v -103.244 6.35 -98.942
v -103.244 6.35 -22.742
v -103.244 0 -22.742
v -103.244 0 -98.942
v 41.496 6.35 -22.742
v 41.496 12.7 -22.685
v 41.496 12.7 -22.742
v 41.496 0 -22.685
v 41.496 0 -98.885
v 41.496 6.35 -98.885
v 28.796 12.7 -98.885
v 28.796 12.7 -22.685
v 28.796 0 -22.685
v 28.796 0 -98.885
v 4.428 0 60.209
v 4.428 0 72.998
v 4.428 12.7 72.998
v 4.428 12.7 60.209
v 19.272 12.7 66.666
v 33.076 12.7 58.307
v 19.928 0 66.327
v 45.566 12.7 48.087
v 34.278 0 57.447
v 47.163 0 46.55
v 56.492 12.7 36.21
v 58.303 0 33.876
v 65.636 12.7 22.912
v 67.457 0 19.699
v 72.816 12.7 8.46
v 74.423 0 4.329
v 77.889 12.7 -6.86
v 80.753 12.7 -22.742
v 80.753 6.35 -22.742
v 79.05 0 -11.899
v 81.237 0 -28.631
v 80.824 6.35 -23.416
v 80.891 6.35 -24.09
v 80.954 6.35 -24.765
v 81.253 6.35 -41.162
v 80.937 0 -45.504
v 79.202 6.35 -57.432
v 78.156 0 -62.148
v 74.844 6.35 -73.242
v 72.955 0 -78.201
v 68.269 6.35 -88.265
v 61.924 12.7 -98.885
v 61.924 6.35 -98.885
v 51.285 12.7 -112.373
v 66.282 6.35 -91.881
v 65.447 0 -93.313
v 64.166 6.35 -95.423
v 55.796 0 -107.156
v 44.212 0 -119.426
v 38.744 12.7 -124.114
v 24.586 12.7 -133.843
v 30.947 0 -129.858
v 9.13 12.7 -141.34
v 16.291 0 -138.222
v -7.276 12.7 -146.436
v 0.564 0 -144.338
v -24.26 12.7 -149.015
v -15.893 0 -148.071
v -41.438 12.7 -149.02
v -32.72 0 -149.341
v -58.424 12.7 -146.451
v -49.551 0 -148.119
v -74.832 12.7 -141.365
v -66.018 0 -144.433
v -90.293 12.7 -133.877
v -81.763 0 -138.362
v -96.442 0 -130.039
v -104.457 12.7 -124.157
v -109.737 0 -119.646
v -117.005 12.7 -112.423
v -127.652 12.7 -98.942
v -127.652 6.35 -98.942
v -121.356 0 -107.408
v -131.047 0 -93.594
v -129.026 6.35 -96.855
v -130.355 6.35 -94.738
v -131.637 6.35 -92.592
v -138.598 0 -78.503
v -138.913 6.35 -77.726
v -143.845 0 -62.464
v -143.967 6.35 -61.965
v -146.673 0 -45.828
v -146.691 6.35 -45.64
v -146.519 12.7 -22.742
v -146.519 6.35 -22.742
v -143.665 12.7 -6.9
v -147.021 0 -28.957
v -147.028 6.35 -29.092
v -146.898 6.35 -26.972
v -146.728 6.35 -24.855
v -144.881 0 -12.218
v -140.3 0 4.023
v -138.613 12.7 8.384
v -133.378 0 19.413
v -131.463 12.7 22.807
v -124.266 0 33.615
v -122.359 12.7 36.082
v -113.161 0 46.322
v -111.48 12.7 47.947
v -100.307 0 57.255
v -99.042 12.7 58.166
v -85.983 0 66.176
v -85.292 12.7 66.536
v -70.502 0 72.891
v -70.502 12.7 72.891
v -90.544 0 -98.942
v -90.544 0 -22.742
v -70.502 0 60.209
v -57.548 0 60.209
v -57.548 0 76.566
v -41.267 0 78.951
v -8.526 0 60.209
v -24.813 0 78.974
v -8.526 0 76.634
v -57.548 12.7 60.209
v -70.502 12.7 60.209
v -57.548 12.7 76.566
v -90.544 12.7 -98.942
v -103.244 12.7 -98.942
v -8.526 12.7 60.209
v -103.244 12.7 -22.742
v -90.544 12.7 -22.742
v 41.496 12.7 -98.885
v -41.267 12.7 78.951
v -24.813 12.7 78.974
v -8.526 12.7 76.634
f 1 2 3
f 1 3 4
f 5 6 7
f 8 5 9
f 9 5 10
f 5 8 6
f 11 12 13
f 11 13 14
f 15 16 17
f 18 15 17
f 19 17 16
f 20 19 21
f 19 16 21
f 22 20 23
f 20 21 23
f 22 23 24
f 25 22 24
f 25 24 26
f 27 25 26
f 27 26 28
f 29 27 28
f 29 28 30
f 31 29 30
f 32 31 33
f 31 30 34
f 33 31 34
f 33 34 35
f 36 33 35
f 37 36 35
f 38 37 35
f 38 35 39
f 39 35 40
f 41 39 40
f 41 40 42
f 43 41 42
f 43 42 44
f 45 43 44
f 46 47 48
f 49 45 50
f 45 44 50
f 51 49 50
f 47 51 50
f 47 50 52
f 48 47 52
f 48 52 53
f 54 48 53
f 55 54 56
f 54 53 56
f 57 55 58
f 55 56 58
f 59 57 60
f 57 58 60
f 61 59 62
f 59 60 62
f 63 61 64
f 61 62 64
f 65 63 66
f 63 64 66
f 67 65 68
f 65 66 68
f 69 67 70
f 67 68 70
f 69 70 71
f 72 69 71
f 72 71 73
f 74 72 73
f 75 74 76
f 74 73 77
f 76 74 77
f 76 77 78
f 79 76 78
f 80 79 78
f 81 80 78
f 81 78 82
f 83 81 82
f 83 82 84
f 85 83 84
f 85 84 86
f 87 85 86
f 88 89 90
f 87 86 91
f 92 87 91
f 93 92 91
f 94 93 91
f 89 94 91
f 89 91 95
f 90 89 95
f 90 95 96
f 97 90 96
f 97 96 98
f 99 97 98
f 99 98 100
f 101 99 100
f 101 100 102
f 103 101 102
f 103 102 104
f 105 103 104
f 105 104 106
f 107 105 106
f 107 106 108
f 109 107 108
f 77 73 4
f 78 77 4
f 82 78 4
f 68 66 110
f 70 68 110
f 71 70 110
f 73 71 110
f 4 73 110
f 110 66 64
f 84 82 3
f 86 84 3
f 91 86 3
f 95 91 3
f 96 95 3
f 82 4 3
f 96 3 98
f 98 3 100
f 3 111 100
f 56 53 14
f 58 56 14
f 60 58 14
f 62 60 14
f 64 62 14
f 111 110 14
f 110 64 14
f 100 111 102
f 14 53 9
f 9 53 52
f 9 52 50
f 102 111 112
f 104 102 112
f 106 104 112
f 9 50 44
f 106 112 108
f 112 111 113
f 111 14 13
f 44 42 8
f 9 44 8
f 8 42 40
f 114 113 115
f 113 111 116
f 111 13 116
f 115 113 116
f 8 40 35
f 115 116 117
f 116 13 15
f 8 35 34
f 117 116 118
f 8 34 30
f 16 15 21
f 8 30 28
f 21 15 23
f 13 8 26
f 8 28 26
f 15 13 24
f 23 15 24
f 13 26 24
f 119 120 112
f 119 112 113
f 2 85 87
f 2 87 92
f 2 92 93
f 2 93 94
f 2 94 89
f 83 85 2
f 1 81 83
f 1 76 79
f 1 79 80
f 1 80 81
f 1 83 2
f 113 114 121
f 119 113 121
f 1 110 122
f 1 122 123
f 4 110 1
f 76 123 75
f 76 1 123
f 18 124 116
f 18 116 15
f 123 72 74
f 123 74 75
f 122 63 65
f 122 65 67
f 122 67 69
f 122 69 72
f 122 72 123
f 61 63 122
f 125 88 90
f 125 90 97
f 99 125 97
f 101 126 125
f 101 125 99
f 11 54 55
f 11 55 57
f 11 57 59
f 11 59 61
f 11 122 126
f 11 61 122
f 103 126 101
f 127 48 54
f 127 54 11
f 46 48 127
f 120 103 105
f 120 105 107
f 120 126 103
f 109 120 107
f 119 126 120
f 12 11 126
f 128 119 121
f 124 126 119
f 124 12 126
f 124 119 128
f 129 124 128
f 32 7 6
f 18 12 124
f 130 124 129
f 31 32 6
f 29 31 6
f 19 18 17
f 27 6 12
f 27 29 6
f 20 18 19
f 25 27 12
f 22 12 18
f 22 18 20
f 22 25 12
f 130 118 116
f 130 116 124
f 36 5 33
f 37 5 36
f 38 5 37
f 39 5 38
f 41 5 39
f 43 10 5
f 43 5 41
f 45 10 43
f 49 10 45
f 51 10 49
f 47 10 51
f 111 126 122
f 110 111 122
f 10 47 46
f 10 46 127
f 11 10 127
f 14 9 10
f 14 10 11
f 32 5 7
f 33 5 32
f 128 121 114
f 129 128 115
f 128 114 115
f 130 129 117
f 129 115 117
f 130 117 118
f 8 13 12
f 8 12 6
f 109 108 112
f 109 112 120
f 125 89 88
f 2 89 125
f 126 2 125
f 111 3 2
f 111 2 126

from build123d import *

# Parameters (mm, degrees)
SKETCH1_R           = 114.3
BOSS_EXTRUDE1_DEPTH = 12.7
SKETCH2_W           = 12.7
SKETCH2_H           = 76.2
BOSS_EXTRUDE2_DEPTH = 34.798
SKETCH3_W           = 12.7
SKETCH3_H           = 76.2
BOSS_EXTRUDE3_DEPTH = 28.740401289
CUT_EXTRUDE1_START  = -6.35
SKETCH4_W           = 28.393004938
SKETCH4_H           = 63.5
CUT_EXTRUDE1_DEPTH  = 6.35
SKETCH5_W           = 12.954
SKETCH5_H           = 12.954
CUT_EXTRUDE3_DEPTH  = 19.05


with BuildPart() as part:
    # Sketch1 → Boss-Extrude1 (new body)
    with BuildSketch(Plane(origin=(0, 0, 0), x_dir=(1, 0, 0), z_dir=(0, 1, 0))):
        with Locations(Location((-32.882992553, 35.040938939, 0), (0, 0, 270))):
            Circle(SKETCH1_R)
    extrude(amount=BOSS_EXTRUDE1_DEPTH)


with BuildPart() as body_2:
    # Sketch2 → Boss-Extrude2 (new body)
    with BuildSketch(Plane(origin=(-68.183595193, 12.7, 21.019137782), x_dir=(1, 0, 0), z_dir=(0, 1, 0))):
        with Locations((-28.710414214, 81.861212069)):
            Rectangle(SKETCH2_W, SKETCH2_H)
    extrude(amount=-BOSS_EXTRUDE2_DEPTH)


with BuildPart() as body_3:
    # Sketch3 → Boss-Extrude3 (new body)
    with BuildSketch(Plane(origin=(0, 12.7, 4.049059252), x_dir=(1, 0, 0), z_dir=(0, 1, 0))):
        with Locations((35.146495172, 64.834549154)):
            Rectangle(SKETCH3_W, SKETCH3_H)
    extrude(amount=-BOSS_EXTRUDE3_DEPTH)


with BuildPart() as part_1:
    add(part.part)

    # Combine1: cut body 2, body 3
    add(body_2.part, mode=Mode.SUBTRACT)
    add(body_3.part, mode=Mode.SUBTRACT)

    # Sketch4 → Cut-Extrude1 (cut)
    with BuildSketch(Plane(origin=(0, 12.7, 0), x_dir=(1, 0, 0), z_dir=(0, 1, 0)).offset(CUT_EXTRUDE1_START)):
        with BuildLine():
            ThreePointArc((81.417007447, 35.040938939), (78.08126298, 62.45305294), (68.268731087, 88.265170308))
            Line((68.268731087, 88.265170308), (41.496495172, 88.265170308))
            Line((41.496495172, 88.265170308), (41.496495172, 24.765170308))
            Line((41.496495172, 24.765170308), (80.954165612, 24.765170308))
            ThreePointArc((80.954165612, 24.765170308), (81.30123836, 29.897845426), (81.417007447, 35.040938939))
        make_face()
        with BuildLine():
            Line((84.866092825, 88.265170308), (68.268731087, 88.265170308))
            ThreePointArc((68.268731087, 88.265170308), (78.08126298, 62.45305294), (81.417007447, 35.040938939))
            ThreePointArc((81.417007447, 35.040938939), (81.30123836, 29.897845426), (80.954165612, 24.765170308))
            Line((80.954165612, 24.765170308), (84.866092825, 24.765170308))
            Line((84.866092825, 24.765170308), (84.866092825, 88.265170308))
        make_face()
        with Locations((-117.440511876, 60.842074288)):
            Rectangle(SKETCH4_W, SKETCH4_H)
        with BuildLine():
            Line((-131.637014345, 29.092074288), (-131.637014345, 92.592074288))
            ThreePointArc((-131.637014345, 92.592074288), (-143.966610555, 61.96527387), (-147.028080092, 29.092074288))
            Line((-147.028080092, 29.092074288), (-131.637014345, 29.092074288))
        make_face()
        with BuildLine():
            Line((-103.244009407, 29.092074288), (-131.637014345, 29.092074288))
            Line((-131.637014345, 29.092074288), (-147.028080092, 29.092074288))
            ThreePointArc((-147.028080092, 29.092074288), (-146.817975763, 25.913529623), (-146.519377256, 22.742074288))
            Line((-146.519377256, 22.742074288), (-103.244009407, 22.742074288))
            Line((-103.244009407, 22.742074288), (-103.244009407, 29.092074288))
        make_face()
        with BuildLine():
            ThreePointArc((-127.651842399, 98.942074288), (-129.696504455, 95.799756515), (-131.637014345, 92.592074288))
            Line((-131.637014345, 92.592074288), (-103.244009407, 92.592074288))
            Line((-103.244009407, 92.592074288), (-103.244009407, 98.942074288))
            Line((-103.244009407, 98.942074288), (-127.651842399, 98.942074288))
        make_face()
        with BuildLine():
            Line((41.496495172, 22.742074288), (80.75339215, 22.742074288))
            ThreePointArc((80.75339215, 22.742074288), (80.858277027, 23.753175898), (80.954165612, 24.765170308))
            Line((80.954165612, 24.765170308), (41.496495172, 24.765170308))
            Line((41.496495172, 24.765170308), (41.496495172, 22.742074288))
        make_face()
        with BuildLine():
            ThreePointArc((68.268731087, 88.265170308), (65.240150005, 93.661233159), (61.923986686, 98.885489901))
            Line((61.923986686, 98.885489901), (41.496495172, 98.885489901))
            Line((41.496495172, 98.885489901), (41.496495172, 88.265170308))
            Line((41.496495172, 88.265170308), (68.268731087, 88.265170308))
        make_face()
    extrude(amount=CUT_EXTRUDE1_DEPTH, mode=Mode.SUBTRACT)

    # Sketch5 → Cut-Extrude3 (cut)
    with BuildSketch(Plane.XY.offset(79.259061061)):
        with Locations((-64.02495724, 6.223)):
            Rectangle(SKETCH5_W, SKETCH5_H)
        with Locations((-2.04895724, 6.223)):
            Rectangle(SKETCH5_W, SKETCH5_H)
    extrude(amount=-CUT_EXTRUDE3_DEPTH, mode=Mode.SUBTRACT)


solid = part_1.part
